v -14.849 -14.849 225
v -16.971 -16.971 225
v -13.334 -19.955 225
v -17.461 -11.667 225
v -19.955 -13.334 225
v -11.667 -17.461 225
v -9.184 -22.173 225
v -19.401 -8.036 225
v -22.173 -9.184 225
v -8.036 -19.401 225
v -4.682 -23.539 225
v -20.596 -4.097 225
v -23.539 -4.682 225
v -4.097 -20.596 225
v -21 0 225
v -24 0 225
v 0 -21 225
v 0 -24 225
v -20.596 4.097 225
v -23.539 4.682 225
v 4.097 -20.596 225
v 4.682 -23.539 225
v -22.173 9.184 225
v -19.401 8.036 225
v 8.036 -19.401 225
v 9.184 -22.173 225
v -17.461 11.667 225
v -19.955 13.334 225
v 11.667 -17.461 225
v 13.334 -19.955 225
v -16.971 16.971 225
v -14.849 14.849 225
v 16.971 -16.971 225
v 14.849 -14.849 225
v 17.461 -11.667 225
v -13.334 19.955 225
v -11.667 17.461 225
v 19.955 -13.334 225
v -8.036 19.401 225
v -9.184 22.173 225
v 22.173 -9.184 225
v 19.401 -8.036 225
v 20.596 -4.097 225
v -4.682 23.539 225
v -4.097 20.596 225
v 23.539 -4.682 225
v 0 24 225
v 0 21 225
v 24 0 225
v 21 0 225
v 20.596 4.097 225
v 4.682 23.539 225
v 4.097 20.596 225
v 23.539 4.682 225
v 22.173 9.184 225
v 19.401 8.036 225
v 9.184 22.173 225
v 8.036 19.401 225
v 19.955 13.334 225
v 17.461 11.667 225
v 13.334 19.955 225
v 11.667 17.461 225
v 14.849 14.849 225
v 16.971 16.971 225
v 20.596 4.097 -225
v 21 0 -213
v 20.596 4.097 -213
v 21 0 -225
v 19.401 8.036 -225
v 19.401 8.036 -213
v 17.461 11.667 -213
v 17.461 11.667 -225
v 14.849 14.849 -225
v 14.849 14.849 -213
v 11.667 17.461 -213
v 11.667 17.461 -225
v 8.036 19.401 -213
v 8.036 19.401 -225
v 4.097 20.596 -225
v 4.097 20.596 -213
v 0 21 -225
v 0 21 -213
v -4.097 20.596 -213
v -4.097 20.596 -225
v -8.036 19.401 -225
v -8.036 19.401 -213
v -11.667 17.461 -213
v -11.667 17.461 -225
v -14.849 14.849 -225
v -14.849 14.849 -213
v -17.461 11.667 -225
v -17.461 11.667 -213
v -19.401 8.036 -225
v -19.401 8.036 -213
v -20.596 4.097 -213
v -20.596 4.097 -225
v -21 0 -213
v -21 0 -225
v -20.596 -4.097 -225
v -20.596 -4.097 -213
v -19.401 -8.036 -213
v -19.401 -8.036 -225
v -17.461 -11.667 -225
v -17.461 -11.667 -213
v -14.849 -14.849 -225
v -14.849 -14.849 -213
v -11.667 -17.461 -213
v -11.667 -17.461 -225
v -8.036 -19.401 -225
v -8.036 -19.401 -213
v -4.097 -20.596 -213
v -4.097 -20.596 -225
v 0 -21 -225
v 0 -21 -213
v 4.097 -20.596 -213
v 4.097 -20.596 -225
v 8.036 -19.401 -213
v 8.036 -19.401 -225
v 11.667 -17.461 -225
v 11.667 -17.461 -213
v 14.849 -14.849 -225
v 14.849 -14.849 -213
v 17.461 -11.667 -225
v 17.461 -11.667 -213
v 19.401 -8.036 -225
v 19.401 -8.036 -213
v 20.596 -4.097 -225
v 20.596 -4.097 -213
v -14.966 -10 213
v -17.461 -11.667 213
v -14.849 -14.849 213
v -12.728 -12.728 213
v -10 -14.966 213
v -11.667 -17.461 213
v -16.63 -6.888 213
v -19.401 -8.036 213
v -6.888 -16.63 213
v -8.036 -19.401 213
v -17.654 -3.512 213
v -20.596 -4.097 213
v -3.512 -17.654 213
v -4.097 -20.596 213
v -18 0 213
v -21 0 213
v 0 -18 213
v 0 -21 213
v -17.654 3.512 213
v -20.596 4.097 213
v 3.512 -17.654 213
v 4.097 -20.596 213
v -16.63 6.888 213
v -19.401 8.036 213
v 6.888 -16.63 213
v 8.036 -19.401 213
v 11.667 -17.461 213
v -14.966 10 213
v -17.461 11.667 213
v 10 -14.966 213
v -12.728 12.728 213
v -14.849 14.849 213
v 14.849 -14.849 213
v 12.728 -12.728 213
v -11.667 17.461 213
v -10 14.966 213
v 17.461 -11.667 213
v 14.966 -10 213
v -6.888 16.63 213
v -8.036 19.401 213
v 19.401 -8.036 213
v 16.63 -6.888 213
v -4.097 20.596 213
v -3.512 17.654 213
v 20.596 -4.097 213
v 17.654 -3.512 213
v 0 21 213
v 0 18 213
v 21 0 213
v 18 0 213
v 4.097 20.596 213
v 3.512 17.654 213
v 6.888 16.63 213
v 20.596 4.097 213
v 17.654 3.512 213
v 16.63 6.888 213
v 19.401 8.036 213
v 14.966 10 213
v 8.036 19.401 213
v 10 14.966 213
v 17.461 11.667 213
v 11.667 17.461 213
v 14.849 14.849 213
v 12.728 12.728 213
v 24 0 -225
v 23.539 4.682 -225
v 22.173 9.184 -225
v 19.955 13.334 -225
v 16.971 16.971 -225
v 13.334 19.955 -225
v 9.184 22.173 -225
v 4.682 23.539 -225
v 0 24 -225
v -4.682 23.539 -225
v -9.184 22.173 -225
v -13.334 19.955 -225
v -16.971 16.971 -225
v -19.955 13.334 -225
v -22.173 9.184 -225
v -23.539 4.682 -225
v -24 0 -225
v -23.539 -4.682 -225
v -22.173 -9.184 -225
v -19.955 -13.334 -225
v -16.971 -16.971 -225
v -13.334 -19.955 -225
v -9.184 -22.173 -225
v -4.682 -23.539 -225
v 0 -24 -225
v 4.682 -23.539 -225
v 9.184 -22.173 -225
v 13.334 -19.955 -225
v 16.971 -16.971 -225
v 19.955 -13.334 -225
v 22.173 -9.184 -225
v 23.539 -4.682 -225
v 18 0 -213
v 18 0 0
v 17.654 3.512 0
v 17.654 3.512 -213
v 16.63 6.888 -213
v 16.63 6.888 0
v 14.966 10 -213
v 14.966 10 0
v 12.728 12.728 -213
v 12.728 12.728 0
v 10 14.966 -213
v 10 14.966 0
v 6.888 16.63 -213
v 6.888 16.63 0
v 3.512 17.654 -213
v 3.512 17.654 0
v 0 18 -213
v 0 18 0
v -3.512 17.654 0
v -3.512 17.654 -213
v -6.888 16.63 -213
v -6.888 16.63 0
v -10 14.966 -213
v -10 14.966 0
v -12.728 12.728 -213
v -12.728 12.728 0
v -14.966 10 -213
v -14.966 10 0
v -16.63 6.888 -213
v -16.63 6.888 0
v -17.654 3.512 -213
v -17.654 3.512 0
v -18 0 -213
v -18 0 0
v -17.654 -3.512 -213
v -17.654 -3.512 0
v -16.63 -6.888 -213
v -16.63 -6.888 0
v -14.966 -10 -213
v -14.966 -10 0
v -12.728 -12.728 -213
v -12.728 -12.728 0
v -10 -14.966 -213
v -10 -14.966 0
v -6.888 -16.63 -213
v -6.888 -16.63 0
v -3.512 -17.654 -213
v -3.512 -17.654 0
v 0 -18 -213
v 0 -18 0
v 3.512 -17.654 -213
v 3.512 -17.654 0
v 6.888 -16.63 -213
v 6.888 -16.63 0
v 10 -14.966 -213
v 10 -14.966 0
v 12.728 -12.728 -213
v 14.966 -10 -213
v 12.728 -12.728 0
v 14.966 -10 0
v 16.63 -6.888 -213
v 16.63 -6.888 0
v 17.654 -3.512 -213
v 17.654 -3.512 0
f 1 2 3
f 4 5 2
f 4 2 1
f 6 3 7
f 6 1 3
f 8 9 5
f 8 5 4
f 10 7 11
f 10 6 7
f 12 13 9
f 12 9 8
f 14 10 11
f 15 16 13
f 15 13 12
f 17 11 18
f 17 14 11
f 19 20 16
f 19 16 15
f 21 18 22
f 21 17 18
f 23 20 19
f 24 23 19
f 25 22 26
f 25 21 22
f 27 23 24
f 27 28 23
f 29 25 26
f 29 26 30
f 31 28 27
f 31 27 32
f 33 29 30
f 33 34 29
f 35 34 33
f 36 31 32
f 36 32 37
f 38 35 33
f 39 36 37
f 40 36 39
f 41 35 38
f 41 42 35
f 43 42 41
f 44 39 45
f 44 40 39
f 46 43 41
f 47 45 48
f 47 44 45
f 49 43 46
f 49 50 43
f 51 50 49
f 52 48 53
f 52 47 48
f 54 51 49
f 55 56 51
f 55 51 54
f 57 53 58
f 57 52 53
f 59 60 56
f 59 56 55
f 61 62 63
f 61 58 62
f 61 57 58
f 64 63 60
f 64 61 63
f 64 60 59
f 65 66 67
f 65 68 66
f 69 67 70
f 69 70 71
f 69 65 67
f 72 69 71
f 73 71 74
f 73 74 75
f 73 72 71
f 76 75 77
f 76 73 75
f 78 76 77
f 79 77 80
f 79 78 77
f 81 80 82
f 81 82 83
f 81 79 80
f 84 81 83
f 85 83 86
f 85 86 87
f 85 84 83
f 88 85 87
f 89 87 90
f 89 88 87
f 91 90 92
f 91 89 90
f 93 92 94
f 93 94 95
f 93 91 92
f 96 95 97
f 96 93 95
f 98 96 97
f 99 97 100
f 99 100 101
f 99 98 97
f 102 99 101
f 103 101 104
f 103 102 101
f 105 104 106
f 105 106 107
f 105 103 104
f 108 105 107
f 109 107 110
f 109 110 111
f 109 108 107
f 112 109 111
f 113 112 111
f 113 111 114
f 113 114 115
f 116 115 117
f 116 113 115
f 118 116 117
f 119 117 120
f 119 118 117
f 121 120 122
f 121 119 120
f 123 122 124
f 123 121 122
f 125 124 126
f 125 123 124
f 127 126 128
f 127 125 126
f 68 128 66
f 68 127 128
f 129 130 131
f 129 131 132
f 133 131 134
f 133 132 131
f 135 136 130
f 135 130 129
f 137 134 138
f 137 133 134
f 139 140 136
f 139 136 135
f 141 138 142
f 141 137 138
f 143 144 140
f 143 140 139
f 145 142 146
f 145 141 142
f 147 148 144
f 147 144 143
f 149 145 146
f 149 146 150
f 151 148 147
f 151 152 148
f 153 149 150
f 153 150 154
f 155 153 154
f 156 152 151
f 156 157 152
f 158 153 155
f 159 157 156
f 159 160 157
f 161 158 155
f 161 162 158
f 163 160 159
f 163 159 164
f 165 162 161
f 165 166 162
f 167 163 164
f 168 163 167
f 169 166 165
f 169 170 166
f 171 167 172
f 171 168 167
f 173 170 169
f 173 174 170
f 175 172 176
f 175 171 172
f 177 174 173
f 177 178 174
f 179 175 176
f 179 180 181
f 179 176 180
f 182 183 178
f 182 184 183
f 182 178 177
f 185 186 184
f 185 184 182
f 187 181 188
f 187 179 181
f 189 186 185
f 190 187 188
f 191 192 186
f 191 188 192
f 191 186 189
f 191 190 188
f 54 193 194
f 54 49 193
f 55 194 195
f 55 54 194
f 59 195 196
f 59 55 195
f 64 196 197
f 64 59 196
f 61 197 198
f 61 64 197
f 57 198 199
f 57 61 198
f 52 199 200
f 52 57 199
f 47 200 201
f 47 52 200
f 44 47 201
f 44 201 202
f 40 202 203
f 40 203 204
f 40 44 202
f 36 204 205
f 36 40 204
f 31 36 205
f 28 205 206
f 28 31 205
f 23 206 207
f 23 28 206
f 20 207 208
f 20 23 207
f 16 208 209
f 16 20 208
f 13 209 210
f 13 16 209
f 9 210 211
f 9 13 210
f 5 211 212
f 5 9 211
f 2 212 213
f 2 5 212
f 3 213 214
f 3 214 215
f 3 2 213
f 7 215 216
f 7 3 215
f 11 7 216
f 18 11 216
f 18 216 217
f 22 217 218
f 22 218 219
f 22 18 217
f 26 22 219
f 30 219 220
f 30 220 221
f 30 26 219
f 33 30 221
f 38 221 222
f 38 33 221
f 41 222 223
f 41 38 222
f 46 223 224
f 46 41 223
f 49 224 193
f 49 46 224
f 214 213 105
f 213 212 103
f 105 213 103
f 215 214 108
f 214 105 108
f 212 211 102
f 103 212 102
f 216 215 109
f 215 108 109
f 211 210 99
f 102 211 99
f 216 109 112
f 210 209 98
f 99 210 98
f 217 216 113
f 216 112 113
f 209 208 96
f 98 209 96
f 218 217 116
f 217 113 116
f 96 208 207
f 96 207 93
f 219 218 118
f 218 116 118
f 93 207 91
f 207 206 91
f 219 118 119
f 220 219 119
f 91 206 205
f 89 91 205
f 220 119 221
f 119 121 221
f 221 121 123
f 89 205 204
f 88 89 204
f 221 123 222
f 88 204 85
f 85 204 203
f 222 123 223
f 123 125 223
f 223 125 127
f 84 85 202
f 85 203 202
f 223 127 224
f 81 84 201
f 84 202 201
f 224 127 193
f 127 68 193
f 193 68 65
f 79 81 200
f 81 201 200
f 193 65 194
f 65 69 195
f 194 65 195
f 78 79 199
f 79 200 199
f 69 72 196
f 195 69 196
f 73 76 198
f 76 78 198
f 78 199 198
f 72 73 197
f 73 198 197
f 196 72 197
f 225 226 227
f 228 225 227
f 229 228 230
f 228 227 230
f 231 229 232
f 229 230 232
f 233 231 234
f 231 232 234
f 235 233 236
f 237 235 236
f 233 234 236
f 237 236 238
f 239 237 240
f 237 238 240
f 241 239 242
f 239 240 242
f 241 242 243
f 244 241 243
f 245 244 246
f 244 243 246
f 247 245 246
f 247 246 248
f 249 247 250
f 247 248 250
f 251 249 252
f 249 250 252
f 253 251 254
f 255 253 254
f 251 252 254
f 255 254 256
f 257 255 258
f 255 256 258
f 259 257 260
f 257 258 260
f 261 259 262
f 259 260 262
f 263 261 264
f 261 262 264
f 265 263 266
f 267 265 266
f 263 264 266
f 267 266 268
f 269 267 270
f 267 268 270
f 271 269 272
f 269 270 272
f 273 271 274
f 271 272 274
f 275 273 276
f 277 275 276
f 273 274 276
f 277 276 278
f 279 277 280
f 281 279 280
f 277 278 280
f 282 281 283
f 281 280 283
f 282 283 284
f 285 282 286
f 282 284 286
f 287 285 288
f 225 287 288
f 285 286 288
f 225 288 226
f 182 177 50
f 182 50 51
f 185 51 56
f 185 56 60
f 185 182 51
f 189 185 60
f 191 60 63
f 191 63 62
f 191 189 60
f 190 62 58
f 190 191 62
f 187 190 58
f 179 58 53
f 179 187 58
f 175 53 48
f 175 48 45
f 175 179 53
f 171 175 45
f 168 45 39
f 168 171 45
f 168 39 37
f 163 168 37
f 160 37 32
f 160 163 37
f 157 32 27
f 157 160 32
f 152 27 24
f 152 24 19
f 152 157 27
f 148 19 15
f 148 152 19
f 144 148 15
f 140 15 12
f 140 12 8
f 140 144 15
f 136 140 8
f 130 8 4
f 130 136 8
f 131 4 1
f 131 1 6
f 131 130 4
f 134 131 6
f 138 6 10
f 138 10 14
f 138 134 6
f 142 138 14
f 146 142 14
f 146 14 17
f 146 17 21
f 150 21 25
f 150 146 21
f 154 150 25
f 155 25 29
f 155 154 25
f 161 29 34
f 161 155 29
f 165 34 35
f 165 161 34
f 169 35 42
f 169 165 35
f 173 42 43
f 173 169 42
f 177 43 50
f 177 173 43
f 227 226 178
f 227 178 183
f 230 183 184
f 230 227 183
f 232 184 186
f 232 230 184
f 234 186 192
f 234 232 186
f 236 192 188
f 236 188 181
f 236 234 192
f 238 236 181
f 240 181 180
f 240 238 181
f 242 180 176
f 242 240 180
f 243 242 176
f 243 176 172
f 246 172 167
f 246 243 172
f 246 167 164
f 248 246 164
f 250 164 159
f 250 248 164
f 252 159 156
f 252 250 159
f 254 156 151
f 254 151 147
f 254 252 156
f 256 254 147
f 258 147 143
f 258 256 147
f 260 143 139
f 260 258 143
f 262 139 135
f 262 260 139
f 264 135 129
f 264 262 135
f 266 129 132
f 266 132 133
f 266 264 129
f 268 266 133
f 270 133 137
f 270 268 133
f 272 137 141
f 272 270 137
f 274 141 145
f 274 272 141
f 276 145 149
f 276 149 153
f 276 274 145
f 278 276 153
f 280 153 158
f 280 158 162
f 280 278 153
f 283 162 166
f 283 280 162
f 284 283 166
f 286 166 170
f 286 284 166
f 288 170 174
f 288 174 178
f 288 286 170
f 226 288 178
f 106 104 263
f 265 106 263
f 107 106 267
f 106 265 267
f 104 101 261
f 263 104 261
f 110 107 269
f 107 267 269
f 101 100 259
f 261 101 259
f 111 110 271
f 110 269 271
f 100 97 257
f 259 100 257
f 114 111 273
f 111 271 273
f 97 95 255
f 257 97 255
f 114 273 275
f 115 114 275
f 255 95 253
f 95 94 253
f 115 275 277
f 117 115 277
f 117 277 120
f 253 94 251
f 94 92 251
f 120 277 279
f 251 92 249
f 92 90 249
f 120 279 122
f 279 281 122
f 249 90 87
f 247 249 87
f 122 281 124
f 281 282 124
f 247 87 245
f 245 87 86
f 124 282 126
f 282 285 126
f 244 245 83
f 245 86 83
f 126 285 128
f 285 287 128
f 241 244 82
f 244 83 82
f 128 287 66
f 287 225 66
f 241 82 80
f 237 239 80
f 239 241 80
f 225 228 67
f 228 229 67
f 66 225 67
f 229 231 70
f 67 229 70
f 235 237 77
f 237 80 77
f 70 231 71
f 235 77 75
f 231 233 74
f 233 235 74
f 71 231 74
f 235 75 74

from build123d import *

# Parameters (mm, degrees)
SKETCH_1_R      = 24
SKETCH_1_R_2    = 21
EXTRUDE_1_DEPTH = 225
EXTRUDE_START   = -225
SKETCH_2_R      = 21
SKETCH_2_R_2    = 18
EXTRUDE_2_DEPTH = 213


with BuildPart() as part:
    # 草图1 → 拉伸-薄壁1 (new, symmetric)
    with BuildSketch(Plane.XY):
        Circle(SKETCH_1_R)
        Circle(SKETCH_1_R_2, mode=Mode.SUBTRACT)
    extrude(amount=EXTRUDE_1_DEPTH, both=True)

    # 草图2 → 拉伸-薄壁2 (add)
    with BuildSketch(Plane.XY.offset(225).offset(EXTRUDE_START)):
        Circle(SKETCH_2_R)
        Circle(SKETCH_2_R_2, mode=Mode.SUBTRACT)
    extrude_2 = extrude(amount=EXTRUDE_2_DEPTH)

    # 镜向1: 拉伸-薄壁2 across plane
    add(extrude_2.mirror(Plane.XY))


solid = part.part
